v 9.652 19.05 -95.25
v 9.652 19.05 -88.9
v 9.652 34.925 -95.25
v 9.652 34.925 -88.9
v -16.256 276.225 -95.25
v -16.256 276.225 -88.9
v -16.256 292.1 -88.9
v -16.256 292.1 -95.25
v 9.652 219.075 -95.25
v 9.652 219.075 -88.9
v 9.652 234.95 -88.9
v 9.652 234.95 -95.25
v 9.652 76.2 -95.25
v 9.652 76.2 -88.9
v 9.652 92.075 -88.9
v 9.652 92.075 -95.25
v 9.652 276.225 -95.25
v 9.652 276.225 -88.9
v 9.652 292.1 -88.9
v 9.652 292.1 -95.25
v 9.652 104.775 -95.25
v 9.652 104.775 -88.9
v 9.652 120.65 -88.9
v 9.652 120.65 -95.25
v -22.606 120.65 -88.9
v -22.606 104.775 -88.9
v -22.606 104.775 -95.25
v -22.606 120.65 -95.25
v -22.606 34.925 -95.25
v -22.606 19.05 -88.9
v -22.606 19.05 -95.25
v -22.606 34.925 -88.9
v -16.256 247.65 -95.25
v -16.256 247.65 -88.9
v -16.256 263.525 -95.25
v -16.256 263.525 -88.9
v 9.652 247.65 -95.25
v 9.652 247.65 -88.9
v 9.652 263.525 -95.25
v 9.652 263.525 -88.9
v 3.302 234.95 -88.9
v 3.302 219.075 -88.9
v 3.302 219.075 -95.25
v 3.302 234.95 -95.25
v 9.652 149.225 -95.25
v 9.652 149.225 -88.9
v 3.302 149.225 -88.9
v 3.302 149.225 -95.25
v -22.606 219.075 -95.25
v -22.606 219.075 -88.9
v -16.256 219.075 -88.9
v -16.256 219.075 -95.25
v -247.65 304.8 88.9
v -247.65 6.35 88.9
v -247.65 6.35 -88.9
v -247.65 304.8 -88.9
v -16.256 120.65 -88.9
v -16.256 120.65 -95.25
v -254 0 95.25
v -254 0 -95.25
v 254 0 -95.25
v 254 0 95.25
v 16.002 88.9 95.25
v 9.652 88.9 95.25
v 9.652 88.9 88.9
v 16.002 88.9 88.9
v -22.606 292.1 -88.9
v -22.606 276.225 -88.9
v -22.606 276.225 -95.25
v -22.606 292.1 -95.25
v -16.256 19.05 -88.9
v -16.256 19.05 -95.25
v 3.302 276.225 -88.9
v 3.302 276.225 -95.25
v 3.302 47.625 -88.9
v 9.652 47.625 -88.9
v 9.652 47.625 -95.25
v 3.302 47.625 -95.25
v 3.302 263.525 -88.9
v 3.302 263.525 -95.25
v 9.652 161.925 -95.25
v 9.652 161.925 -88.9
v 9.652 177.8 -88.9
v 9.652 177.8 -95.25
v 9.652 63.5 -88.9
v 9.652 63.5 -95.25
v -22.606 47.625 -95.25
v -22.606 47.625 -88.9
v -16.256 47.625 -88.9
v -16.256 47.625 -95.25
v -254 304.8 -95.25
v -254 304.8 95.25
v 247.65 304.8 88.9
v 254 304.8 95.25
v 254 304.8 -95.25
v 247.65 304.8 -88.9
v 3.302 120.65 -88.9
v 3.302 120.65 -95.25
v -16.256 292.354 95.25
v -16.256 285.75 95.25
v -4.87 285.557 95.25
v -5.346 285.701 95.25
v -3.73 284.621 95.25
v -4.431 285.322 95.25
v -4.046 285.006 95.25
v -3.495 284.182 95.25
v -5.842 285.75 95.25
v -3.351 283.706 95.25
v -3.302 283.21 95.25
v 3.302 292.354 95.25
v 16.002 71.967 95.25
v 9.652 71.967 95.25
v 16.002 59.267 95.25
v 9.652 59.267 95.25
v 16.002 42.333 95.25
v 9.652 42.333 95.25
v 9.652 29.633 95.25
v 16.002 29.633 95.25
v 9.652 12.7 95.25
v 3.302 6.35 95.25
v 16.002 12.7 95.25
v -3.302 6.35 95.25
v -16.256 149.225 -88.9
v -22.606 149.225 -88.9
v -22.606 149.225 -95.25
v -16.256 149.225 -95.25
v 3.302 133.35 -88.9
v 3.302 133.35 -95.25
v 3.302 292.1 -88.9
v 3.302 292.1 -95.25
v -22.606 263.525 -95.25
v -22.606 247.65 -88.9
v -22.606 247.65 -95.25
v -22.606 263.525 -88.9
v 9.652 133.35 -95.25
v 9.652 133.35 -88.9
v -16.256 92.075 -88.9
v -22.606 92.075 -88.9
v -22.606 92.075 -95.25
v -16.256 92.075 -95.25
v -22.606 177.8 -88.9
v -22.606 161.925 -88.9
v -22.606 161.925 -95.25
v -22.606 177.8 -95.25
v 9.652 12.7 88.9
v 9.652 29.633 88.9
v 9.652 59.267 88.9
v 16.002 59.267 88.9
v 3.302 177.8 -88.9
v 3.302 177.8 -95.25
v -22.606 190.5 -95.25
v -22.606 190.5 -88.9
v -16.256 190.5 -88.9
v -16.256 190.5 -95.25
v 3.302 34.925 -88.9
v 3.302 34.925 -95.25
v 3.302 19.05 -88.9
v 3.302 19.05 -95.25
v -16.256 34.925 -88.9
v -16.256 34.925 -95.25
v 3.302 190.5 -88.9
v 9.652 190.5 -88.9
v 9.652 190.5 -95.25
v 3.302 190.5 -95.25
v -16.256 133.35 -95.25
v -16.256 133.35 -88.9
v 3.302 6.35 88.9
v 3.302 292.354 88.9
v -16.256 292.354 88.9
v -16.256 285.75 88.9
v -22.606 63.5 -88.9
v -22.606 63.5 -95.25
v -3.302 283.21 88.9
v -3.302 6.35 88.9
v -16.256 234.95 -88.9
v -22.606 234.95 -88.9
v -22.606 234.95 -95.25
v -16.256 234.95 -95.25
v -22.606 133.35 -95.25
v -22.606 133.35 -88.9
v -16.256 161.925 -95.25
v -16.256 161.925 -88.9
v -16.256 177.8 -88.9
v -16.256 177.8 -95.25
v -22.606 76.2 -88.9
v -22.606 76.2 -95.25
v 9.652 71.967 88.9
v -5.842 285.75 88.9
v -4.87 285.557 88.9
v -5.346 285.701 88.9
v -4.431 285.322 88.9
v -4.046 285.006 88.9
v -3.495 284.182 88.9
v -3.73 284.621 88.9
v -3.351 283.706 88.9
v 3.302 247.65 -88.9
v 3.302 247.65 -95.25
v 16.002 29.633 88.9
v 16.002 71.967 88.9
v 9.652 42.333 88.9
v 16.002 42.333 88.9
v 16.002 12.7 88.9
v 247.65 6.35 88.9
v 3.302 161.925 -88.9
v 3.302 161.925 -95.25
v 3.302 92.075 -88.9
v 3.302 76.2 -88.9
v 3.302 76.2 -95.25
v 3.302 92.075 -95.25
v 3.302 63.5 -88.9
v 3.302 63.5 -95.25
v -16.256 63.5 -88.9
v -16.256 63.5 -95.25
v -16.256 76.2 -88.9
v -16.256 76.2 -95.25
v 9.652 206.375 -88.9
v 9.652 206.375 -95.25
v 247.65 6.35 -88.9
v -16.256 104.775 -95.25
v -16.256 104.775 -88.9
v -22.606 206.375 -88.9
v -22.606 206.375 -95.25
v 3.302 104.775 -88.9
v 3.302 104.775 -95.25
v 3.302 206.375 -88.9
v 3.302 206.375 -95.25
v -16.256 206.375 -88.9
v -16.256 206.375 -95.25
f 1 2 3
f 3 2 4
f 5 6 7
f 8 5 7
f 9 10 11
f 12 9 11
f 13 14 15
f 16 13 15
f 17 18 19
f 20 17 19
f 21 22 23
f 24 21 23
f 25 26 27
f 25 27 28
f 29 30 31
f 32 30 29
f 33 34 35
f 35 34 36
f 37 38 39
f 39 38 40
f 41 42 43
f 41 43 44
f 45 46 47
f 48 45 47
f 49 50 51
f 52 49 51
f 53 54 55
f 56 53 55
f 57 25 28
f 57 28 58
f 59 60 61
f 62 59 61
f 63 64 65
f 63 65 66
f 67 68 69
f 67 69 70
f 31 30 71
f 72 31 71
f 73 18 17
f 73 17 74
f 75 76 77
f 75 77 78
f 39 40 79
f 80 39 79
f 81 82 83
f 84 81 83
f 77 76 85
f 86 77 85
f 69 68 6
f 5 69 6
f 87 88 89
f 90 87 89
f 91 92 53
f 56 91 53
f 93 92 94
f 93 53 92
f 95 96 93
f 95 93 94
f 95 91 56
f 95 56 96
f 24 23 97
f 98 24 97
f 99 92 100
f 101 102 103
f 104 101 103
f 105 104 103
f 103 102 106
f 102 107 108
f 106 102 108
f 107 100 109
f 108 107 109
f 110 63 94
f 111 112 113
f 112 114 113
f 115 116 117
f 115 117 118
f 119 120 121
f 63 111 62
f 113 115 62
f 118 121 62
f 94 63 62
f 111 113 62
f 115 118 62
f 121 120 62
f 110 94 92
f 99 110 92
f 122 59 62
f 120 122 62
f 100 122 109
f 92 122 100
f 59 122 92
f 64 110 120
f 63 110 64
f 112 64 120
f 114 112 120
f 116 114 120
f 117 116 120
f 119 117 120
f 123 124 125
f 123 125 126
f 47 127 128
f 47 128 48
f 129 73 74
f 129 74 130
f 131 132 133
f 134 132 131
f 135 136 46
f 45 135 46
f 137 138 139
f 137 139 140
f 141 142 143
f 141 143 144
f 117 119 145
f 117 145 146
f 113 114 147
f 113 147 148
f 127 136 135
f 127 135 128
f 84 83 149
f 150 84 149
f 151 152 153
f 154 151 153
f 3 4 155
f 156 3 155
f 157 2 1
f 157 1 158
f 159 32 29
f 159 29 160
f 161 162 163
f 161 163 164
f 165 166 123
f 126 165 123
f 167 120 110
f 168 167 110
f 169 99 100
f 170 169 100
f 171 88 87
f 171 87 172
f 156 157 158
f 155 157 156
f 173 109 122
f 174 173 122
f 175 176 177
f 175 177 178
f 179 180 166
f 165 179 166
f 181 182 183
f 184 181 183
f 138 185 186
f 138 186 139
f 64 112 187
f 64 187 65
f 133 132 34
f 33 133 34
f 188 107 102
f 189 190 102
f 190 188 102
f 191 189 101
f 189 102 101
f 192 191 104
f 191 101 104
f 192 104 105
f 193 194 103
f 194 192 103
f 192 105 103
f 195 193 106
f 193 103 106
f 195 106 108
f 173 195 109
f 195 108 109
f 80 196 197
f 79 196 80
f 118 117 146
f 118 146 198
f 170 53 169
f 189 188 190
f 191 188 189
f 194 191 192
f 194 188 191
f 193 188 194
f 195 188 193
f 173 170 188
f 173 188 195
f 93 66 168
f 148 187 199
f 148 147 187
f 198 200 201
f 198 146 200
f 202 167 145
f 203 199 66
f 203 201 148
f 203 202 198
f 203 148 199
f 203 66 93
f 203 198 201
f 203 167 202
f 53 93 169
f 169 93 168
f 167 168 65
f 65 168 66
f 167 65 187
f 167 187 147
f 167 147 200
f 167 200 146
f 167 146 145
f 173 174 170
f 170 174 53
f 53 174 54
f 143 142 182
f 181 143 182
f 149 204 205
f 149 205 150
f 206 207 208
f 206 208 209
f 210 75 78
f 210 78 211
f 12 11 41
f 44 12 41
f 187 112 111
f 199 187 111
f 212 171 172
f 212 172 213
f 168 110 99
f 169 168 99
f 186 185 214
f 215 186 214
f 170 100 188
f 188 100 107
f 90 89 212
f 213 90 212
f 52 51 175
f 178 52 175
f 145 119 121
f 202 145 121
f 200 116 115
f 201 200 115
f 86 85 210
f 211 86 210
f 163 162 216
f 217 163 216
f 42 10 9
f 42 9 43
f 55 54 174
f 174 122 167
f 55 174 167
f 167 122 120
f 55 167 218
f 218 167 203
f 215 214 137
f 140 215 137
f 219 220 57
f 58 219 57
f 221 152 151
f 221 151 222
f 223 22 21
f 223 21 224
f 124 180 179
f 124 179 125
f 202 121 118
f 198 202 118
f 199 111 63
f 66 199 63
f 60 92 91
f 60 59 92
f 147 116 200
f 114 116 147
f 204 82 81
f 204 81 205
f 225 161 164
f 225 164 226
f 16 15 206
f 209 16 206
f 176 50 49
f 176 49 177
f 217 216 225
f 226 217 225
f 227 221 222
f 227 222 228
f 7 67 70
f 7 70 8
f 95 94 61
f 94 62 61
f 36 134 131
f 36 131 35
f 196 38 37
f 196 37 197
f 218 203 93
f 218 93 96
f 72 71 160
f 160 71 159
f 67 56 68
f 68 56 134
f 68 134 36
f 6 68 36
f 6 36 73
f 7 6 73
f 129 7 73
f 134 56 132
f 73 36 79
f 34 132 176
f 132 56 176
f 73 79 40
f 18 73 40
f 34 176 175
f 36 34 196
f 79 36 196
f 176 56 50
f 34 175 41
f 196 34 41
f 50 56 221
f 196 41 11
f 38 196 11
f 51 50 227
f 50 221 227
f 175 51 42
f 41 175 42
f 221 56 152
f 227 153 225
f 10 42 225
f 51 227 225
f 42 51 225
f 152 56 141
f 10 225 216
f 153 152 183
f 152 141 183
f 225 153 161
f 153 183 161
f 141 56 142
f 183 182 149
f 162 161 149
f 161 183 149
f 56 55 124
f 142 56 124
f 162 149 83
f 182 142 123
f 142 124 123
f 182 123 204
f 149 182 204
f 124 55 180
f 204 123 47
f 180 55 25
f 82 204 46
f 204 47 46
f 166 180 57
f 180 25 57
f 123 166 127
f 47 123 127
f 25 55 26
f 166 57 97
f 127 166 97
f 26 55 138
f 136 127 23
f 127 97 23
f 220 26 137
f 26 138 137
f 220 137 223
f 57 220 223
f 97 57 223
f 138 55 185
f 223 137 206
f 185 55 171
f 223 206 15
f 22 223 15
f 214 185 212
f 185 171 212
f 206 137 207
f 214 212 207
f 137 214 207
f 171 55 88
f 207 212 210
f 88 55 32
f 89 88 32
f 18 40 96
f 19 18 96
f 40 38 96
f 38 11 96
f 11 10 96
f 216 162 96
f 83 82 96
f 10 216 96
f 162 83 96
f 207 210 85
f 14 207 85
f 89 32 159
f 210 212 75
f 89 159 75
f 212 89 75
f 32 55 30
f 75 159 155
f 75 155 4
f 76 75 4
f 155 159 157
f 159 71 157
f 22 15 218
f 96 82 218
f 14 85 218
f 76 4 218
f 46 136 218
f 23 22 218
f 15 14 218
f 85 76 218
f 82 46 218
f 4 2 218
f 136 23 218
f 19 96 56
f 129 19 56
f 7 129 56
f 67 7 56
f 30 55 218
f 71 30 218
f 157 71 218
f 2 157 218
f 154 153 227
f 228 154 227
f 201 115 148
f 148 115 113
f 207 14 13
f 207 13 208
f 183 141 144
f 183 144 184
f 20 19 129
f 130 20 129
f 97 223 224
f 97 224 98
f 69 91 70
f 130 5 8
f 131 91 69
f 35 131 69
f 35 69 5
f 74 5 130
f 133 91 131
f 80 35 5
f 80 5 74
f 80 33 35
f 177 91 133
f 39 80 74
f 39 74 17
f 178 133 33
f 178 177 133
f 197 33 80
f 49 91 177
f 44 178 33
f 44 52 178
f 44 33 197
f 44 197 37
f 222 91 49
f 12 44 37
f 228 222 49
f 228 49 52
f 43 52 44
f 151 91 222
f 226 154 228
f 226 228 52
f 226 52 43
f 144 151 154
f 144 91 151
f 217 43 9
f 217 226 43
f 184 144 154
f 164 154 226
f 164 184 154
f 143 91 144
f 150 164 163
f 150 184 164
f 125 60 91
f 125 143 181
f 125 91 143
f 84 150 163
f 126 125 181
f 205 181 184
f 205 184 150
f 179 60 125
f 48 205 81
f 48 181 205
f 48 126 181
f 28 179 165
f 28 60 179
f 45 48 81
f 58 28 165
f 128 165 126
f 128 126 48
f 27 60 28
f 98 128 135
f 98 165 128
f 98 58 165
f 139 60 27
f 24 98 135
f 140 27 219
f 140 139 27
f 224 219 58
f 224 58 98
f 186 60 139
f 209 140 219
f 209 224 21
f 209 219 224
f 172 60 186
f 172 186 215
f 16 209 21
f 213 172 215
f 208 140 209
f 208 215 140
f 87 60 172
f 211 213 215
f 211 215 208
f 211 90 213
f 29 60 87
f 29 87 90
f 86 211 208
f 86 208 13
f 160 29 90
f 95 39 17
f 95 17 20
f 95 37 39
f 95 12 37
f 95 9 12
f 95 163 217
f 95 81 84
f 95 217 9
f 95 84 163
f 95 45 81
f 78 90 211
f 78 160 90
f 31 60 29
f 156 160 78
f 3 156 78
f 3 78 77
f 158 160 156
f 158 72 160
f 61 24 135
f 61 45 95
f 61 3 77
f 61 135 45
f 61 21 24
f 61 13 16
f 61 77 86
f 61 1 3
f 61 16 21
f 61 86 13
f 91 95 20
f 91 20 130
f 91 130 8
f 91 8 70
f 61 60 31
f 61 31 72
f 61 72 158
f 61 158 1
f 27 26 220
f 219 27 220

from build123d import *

# Parameters (mm, degrees)
SKETCH1_W           = 508
SKETCH1_H           = 190.5
BOSS_EXTRUDE1_DEPTH = 6.35
SKETCH2_W           = 508
SKETCH2_H           = 190.5
SKETCH2_W_2         = 495.3
SKETCH2_H_2         = 177.8
BOSS_EXTRUDE2_DEPTH = 298.45
SKETCH3_W           = 6.35
SKETCH3_H           = 16.933333333
SKETCH3_H_2         = 16.933333334
CUT_EXTRUDE1_DEPTH  = 12.7
SKETCH4_W           = 6.35
SKETCH4_H           = 15.875
CUT_EXTRUDE2_DEPTH  = 6.35


with BuildPart() as part:
    # Sketch1 → Boss-Extrude1 (new body)
    with BuildSketch(Plane(origin=(0, 0, 0), x_dir=(1, 0, 0), z_dir=(0, 1, 0))):
        Rectangle(SKETCH1_W, SKETCH1_H)
    extrude(amount=BOSS_EXTRUDE1_DEPTH)

    # Sketch2 → Boss-Extrude2 (add)
    with BuildSketch(Plane(origin=(0, 6.35, 0), x_dir=(1, 0, 0), z_dir=(0, 1, 0))):
        Rectangle(SKETCH2_W, SKETCH2_H)
        Rectangle(SKETCH2_W_2, SKETCH2_H_2, mode=Mode.SUBTRACT)
    extrude(amount=BOSS_EXTRUDE2_DEPTH)

    # Sketch3 → Cut-Extrude1 (cut)
    with BuildSketch(Plane.XY.offset(95.25)):
        with BuildLine():
            Line((-3.302, 283.21), (-3.302, 6.35))
            Line((-3.302, 6.35), (3.302, 6.35))
            Line((3.302, 6.35), (3.302, 292.354))
            Line((3.302, 292.354), (-16.256, 292.354))
            Line((-16.256, 292.354), (-16.256, 285.75))
            Line((-16.256, 285.75), (-5.842, 285.75))
            ThreePointArc((-5.842, 285.75), (-4.045948776, 285.006051224), (-3.302, 283.21))
        make_face()
        with Locations((12.827, 80.433333334)):
            Rectangle(SKETCH3_W, SKETCH3_H)
        with Locations((12.827, 50.8)):
            Rectangle(SKETCH3_W, SKETCH3_H_2)
        with Locations((12.827, 21.166666667)):
            Rectangle(SKETCH3_W, SKETCH3_H)
    extrude(amount=-CUT_EXTRUDE1_DEPTH, mode=Mode.SUBTRACT)

    # Sketch4 → Cut-Extrude2 (cut)
    with BuildSketch(Plane.XY.offset(-88.9)):
        with Locations((-19.431, 284.1625)):
            Rectangle(SKETCH4_W, SKETCH4_H)
        with Locations((-19.431, 255.5875)):
            Rectangle(SKETCH4_W, SKETCH4_H)
        with Locations((-19.431, 227.0125)):
            Rectangle(SKETCH4_W, SKETCH4_H)
        with Locations((-19.431, 198.4375)):
            Rectangle(SKETCH4_W, SKETCH4_H)
        with Locations((-19.431, 169.8625)):
            Rectangle(SKETCH4_W, SKETCH4_H)
        with Locations((-19.431, 141.2875)):
            Rectangle(SKETCH4_W, SKETCH4_H)
        with Locations((-19.431, 112.7125)):
            Rectangle(SKETCH4_W, SKETCH4_H)
        with Locations((-19.431, 84.1375)):
            Rectangle(SKETCH4_W, SKETCH4_H)
        with Locations((-19.431, 55.5625)):
            Rectangle(SKETCH4_W, SKETCH4_H)
        with Locations((-19.431, 26.9875)):
            Rectangle(SKETCH4_W, SKETCH4_H)
    cut_extrude2 = extrude(amount=-CUT_EXTRUDE2_DEPTH, mode=Mode.SUBTRACT)

    # Mirror1: Cut-Extrude2 across plane
    add(cut_extrude2.mirror(Plane.ZY.offset(6.477)), mode=Mode.SUBTRACT)


solid = part.part
